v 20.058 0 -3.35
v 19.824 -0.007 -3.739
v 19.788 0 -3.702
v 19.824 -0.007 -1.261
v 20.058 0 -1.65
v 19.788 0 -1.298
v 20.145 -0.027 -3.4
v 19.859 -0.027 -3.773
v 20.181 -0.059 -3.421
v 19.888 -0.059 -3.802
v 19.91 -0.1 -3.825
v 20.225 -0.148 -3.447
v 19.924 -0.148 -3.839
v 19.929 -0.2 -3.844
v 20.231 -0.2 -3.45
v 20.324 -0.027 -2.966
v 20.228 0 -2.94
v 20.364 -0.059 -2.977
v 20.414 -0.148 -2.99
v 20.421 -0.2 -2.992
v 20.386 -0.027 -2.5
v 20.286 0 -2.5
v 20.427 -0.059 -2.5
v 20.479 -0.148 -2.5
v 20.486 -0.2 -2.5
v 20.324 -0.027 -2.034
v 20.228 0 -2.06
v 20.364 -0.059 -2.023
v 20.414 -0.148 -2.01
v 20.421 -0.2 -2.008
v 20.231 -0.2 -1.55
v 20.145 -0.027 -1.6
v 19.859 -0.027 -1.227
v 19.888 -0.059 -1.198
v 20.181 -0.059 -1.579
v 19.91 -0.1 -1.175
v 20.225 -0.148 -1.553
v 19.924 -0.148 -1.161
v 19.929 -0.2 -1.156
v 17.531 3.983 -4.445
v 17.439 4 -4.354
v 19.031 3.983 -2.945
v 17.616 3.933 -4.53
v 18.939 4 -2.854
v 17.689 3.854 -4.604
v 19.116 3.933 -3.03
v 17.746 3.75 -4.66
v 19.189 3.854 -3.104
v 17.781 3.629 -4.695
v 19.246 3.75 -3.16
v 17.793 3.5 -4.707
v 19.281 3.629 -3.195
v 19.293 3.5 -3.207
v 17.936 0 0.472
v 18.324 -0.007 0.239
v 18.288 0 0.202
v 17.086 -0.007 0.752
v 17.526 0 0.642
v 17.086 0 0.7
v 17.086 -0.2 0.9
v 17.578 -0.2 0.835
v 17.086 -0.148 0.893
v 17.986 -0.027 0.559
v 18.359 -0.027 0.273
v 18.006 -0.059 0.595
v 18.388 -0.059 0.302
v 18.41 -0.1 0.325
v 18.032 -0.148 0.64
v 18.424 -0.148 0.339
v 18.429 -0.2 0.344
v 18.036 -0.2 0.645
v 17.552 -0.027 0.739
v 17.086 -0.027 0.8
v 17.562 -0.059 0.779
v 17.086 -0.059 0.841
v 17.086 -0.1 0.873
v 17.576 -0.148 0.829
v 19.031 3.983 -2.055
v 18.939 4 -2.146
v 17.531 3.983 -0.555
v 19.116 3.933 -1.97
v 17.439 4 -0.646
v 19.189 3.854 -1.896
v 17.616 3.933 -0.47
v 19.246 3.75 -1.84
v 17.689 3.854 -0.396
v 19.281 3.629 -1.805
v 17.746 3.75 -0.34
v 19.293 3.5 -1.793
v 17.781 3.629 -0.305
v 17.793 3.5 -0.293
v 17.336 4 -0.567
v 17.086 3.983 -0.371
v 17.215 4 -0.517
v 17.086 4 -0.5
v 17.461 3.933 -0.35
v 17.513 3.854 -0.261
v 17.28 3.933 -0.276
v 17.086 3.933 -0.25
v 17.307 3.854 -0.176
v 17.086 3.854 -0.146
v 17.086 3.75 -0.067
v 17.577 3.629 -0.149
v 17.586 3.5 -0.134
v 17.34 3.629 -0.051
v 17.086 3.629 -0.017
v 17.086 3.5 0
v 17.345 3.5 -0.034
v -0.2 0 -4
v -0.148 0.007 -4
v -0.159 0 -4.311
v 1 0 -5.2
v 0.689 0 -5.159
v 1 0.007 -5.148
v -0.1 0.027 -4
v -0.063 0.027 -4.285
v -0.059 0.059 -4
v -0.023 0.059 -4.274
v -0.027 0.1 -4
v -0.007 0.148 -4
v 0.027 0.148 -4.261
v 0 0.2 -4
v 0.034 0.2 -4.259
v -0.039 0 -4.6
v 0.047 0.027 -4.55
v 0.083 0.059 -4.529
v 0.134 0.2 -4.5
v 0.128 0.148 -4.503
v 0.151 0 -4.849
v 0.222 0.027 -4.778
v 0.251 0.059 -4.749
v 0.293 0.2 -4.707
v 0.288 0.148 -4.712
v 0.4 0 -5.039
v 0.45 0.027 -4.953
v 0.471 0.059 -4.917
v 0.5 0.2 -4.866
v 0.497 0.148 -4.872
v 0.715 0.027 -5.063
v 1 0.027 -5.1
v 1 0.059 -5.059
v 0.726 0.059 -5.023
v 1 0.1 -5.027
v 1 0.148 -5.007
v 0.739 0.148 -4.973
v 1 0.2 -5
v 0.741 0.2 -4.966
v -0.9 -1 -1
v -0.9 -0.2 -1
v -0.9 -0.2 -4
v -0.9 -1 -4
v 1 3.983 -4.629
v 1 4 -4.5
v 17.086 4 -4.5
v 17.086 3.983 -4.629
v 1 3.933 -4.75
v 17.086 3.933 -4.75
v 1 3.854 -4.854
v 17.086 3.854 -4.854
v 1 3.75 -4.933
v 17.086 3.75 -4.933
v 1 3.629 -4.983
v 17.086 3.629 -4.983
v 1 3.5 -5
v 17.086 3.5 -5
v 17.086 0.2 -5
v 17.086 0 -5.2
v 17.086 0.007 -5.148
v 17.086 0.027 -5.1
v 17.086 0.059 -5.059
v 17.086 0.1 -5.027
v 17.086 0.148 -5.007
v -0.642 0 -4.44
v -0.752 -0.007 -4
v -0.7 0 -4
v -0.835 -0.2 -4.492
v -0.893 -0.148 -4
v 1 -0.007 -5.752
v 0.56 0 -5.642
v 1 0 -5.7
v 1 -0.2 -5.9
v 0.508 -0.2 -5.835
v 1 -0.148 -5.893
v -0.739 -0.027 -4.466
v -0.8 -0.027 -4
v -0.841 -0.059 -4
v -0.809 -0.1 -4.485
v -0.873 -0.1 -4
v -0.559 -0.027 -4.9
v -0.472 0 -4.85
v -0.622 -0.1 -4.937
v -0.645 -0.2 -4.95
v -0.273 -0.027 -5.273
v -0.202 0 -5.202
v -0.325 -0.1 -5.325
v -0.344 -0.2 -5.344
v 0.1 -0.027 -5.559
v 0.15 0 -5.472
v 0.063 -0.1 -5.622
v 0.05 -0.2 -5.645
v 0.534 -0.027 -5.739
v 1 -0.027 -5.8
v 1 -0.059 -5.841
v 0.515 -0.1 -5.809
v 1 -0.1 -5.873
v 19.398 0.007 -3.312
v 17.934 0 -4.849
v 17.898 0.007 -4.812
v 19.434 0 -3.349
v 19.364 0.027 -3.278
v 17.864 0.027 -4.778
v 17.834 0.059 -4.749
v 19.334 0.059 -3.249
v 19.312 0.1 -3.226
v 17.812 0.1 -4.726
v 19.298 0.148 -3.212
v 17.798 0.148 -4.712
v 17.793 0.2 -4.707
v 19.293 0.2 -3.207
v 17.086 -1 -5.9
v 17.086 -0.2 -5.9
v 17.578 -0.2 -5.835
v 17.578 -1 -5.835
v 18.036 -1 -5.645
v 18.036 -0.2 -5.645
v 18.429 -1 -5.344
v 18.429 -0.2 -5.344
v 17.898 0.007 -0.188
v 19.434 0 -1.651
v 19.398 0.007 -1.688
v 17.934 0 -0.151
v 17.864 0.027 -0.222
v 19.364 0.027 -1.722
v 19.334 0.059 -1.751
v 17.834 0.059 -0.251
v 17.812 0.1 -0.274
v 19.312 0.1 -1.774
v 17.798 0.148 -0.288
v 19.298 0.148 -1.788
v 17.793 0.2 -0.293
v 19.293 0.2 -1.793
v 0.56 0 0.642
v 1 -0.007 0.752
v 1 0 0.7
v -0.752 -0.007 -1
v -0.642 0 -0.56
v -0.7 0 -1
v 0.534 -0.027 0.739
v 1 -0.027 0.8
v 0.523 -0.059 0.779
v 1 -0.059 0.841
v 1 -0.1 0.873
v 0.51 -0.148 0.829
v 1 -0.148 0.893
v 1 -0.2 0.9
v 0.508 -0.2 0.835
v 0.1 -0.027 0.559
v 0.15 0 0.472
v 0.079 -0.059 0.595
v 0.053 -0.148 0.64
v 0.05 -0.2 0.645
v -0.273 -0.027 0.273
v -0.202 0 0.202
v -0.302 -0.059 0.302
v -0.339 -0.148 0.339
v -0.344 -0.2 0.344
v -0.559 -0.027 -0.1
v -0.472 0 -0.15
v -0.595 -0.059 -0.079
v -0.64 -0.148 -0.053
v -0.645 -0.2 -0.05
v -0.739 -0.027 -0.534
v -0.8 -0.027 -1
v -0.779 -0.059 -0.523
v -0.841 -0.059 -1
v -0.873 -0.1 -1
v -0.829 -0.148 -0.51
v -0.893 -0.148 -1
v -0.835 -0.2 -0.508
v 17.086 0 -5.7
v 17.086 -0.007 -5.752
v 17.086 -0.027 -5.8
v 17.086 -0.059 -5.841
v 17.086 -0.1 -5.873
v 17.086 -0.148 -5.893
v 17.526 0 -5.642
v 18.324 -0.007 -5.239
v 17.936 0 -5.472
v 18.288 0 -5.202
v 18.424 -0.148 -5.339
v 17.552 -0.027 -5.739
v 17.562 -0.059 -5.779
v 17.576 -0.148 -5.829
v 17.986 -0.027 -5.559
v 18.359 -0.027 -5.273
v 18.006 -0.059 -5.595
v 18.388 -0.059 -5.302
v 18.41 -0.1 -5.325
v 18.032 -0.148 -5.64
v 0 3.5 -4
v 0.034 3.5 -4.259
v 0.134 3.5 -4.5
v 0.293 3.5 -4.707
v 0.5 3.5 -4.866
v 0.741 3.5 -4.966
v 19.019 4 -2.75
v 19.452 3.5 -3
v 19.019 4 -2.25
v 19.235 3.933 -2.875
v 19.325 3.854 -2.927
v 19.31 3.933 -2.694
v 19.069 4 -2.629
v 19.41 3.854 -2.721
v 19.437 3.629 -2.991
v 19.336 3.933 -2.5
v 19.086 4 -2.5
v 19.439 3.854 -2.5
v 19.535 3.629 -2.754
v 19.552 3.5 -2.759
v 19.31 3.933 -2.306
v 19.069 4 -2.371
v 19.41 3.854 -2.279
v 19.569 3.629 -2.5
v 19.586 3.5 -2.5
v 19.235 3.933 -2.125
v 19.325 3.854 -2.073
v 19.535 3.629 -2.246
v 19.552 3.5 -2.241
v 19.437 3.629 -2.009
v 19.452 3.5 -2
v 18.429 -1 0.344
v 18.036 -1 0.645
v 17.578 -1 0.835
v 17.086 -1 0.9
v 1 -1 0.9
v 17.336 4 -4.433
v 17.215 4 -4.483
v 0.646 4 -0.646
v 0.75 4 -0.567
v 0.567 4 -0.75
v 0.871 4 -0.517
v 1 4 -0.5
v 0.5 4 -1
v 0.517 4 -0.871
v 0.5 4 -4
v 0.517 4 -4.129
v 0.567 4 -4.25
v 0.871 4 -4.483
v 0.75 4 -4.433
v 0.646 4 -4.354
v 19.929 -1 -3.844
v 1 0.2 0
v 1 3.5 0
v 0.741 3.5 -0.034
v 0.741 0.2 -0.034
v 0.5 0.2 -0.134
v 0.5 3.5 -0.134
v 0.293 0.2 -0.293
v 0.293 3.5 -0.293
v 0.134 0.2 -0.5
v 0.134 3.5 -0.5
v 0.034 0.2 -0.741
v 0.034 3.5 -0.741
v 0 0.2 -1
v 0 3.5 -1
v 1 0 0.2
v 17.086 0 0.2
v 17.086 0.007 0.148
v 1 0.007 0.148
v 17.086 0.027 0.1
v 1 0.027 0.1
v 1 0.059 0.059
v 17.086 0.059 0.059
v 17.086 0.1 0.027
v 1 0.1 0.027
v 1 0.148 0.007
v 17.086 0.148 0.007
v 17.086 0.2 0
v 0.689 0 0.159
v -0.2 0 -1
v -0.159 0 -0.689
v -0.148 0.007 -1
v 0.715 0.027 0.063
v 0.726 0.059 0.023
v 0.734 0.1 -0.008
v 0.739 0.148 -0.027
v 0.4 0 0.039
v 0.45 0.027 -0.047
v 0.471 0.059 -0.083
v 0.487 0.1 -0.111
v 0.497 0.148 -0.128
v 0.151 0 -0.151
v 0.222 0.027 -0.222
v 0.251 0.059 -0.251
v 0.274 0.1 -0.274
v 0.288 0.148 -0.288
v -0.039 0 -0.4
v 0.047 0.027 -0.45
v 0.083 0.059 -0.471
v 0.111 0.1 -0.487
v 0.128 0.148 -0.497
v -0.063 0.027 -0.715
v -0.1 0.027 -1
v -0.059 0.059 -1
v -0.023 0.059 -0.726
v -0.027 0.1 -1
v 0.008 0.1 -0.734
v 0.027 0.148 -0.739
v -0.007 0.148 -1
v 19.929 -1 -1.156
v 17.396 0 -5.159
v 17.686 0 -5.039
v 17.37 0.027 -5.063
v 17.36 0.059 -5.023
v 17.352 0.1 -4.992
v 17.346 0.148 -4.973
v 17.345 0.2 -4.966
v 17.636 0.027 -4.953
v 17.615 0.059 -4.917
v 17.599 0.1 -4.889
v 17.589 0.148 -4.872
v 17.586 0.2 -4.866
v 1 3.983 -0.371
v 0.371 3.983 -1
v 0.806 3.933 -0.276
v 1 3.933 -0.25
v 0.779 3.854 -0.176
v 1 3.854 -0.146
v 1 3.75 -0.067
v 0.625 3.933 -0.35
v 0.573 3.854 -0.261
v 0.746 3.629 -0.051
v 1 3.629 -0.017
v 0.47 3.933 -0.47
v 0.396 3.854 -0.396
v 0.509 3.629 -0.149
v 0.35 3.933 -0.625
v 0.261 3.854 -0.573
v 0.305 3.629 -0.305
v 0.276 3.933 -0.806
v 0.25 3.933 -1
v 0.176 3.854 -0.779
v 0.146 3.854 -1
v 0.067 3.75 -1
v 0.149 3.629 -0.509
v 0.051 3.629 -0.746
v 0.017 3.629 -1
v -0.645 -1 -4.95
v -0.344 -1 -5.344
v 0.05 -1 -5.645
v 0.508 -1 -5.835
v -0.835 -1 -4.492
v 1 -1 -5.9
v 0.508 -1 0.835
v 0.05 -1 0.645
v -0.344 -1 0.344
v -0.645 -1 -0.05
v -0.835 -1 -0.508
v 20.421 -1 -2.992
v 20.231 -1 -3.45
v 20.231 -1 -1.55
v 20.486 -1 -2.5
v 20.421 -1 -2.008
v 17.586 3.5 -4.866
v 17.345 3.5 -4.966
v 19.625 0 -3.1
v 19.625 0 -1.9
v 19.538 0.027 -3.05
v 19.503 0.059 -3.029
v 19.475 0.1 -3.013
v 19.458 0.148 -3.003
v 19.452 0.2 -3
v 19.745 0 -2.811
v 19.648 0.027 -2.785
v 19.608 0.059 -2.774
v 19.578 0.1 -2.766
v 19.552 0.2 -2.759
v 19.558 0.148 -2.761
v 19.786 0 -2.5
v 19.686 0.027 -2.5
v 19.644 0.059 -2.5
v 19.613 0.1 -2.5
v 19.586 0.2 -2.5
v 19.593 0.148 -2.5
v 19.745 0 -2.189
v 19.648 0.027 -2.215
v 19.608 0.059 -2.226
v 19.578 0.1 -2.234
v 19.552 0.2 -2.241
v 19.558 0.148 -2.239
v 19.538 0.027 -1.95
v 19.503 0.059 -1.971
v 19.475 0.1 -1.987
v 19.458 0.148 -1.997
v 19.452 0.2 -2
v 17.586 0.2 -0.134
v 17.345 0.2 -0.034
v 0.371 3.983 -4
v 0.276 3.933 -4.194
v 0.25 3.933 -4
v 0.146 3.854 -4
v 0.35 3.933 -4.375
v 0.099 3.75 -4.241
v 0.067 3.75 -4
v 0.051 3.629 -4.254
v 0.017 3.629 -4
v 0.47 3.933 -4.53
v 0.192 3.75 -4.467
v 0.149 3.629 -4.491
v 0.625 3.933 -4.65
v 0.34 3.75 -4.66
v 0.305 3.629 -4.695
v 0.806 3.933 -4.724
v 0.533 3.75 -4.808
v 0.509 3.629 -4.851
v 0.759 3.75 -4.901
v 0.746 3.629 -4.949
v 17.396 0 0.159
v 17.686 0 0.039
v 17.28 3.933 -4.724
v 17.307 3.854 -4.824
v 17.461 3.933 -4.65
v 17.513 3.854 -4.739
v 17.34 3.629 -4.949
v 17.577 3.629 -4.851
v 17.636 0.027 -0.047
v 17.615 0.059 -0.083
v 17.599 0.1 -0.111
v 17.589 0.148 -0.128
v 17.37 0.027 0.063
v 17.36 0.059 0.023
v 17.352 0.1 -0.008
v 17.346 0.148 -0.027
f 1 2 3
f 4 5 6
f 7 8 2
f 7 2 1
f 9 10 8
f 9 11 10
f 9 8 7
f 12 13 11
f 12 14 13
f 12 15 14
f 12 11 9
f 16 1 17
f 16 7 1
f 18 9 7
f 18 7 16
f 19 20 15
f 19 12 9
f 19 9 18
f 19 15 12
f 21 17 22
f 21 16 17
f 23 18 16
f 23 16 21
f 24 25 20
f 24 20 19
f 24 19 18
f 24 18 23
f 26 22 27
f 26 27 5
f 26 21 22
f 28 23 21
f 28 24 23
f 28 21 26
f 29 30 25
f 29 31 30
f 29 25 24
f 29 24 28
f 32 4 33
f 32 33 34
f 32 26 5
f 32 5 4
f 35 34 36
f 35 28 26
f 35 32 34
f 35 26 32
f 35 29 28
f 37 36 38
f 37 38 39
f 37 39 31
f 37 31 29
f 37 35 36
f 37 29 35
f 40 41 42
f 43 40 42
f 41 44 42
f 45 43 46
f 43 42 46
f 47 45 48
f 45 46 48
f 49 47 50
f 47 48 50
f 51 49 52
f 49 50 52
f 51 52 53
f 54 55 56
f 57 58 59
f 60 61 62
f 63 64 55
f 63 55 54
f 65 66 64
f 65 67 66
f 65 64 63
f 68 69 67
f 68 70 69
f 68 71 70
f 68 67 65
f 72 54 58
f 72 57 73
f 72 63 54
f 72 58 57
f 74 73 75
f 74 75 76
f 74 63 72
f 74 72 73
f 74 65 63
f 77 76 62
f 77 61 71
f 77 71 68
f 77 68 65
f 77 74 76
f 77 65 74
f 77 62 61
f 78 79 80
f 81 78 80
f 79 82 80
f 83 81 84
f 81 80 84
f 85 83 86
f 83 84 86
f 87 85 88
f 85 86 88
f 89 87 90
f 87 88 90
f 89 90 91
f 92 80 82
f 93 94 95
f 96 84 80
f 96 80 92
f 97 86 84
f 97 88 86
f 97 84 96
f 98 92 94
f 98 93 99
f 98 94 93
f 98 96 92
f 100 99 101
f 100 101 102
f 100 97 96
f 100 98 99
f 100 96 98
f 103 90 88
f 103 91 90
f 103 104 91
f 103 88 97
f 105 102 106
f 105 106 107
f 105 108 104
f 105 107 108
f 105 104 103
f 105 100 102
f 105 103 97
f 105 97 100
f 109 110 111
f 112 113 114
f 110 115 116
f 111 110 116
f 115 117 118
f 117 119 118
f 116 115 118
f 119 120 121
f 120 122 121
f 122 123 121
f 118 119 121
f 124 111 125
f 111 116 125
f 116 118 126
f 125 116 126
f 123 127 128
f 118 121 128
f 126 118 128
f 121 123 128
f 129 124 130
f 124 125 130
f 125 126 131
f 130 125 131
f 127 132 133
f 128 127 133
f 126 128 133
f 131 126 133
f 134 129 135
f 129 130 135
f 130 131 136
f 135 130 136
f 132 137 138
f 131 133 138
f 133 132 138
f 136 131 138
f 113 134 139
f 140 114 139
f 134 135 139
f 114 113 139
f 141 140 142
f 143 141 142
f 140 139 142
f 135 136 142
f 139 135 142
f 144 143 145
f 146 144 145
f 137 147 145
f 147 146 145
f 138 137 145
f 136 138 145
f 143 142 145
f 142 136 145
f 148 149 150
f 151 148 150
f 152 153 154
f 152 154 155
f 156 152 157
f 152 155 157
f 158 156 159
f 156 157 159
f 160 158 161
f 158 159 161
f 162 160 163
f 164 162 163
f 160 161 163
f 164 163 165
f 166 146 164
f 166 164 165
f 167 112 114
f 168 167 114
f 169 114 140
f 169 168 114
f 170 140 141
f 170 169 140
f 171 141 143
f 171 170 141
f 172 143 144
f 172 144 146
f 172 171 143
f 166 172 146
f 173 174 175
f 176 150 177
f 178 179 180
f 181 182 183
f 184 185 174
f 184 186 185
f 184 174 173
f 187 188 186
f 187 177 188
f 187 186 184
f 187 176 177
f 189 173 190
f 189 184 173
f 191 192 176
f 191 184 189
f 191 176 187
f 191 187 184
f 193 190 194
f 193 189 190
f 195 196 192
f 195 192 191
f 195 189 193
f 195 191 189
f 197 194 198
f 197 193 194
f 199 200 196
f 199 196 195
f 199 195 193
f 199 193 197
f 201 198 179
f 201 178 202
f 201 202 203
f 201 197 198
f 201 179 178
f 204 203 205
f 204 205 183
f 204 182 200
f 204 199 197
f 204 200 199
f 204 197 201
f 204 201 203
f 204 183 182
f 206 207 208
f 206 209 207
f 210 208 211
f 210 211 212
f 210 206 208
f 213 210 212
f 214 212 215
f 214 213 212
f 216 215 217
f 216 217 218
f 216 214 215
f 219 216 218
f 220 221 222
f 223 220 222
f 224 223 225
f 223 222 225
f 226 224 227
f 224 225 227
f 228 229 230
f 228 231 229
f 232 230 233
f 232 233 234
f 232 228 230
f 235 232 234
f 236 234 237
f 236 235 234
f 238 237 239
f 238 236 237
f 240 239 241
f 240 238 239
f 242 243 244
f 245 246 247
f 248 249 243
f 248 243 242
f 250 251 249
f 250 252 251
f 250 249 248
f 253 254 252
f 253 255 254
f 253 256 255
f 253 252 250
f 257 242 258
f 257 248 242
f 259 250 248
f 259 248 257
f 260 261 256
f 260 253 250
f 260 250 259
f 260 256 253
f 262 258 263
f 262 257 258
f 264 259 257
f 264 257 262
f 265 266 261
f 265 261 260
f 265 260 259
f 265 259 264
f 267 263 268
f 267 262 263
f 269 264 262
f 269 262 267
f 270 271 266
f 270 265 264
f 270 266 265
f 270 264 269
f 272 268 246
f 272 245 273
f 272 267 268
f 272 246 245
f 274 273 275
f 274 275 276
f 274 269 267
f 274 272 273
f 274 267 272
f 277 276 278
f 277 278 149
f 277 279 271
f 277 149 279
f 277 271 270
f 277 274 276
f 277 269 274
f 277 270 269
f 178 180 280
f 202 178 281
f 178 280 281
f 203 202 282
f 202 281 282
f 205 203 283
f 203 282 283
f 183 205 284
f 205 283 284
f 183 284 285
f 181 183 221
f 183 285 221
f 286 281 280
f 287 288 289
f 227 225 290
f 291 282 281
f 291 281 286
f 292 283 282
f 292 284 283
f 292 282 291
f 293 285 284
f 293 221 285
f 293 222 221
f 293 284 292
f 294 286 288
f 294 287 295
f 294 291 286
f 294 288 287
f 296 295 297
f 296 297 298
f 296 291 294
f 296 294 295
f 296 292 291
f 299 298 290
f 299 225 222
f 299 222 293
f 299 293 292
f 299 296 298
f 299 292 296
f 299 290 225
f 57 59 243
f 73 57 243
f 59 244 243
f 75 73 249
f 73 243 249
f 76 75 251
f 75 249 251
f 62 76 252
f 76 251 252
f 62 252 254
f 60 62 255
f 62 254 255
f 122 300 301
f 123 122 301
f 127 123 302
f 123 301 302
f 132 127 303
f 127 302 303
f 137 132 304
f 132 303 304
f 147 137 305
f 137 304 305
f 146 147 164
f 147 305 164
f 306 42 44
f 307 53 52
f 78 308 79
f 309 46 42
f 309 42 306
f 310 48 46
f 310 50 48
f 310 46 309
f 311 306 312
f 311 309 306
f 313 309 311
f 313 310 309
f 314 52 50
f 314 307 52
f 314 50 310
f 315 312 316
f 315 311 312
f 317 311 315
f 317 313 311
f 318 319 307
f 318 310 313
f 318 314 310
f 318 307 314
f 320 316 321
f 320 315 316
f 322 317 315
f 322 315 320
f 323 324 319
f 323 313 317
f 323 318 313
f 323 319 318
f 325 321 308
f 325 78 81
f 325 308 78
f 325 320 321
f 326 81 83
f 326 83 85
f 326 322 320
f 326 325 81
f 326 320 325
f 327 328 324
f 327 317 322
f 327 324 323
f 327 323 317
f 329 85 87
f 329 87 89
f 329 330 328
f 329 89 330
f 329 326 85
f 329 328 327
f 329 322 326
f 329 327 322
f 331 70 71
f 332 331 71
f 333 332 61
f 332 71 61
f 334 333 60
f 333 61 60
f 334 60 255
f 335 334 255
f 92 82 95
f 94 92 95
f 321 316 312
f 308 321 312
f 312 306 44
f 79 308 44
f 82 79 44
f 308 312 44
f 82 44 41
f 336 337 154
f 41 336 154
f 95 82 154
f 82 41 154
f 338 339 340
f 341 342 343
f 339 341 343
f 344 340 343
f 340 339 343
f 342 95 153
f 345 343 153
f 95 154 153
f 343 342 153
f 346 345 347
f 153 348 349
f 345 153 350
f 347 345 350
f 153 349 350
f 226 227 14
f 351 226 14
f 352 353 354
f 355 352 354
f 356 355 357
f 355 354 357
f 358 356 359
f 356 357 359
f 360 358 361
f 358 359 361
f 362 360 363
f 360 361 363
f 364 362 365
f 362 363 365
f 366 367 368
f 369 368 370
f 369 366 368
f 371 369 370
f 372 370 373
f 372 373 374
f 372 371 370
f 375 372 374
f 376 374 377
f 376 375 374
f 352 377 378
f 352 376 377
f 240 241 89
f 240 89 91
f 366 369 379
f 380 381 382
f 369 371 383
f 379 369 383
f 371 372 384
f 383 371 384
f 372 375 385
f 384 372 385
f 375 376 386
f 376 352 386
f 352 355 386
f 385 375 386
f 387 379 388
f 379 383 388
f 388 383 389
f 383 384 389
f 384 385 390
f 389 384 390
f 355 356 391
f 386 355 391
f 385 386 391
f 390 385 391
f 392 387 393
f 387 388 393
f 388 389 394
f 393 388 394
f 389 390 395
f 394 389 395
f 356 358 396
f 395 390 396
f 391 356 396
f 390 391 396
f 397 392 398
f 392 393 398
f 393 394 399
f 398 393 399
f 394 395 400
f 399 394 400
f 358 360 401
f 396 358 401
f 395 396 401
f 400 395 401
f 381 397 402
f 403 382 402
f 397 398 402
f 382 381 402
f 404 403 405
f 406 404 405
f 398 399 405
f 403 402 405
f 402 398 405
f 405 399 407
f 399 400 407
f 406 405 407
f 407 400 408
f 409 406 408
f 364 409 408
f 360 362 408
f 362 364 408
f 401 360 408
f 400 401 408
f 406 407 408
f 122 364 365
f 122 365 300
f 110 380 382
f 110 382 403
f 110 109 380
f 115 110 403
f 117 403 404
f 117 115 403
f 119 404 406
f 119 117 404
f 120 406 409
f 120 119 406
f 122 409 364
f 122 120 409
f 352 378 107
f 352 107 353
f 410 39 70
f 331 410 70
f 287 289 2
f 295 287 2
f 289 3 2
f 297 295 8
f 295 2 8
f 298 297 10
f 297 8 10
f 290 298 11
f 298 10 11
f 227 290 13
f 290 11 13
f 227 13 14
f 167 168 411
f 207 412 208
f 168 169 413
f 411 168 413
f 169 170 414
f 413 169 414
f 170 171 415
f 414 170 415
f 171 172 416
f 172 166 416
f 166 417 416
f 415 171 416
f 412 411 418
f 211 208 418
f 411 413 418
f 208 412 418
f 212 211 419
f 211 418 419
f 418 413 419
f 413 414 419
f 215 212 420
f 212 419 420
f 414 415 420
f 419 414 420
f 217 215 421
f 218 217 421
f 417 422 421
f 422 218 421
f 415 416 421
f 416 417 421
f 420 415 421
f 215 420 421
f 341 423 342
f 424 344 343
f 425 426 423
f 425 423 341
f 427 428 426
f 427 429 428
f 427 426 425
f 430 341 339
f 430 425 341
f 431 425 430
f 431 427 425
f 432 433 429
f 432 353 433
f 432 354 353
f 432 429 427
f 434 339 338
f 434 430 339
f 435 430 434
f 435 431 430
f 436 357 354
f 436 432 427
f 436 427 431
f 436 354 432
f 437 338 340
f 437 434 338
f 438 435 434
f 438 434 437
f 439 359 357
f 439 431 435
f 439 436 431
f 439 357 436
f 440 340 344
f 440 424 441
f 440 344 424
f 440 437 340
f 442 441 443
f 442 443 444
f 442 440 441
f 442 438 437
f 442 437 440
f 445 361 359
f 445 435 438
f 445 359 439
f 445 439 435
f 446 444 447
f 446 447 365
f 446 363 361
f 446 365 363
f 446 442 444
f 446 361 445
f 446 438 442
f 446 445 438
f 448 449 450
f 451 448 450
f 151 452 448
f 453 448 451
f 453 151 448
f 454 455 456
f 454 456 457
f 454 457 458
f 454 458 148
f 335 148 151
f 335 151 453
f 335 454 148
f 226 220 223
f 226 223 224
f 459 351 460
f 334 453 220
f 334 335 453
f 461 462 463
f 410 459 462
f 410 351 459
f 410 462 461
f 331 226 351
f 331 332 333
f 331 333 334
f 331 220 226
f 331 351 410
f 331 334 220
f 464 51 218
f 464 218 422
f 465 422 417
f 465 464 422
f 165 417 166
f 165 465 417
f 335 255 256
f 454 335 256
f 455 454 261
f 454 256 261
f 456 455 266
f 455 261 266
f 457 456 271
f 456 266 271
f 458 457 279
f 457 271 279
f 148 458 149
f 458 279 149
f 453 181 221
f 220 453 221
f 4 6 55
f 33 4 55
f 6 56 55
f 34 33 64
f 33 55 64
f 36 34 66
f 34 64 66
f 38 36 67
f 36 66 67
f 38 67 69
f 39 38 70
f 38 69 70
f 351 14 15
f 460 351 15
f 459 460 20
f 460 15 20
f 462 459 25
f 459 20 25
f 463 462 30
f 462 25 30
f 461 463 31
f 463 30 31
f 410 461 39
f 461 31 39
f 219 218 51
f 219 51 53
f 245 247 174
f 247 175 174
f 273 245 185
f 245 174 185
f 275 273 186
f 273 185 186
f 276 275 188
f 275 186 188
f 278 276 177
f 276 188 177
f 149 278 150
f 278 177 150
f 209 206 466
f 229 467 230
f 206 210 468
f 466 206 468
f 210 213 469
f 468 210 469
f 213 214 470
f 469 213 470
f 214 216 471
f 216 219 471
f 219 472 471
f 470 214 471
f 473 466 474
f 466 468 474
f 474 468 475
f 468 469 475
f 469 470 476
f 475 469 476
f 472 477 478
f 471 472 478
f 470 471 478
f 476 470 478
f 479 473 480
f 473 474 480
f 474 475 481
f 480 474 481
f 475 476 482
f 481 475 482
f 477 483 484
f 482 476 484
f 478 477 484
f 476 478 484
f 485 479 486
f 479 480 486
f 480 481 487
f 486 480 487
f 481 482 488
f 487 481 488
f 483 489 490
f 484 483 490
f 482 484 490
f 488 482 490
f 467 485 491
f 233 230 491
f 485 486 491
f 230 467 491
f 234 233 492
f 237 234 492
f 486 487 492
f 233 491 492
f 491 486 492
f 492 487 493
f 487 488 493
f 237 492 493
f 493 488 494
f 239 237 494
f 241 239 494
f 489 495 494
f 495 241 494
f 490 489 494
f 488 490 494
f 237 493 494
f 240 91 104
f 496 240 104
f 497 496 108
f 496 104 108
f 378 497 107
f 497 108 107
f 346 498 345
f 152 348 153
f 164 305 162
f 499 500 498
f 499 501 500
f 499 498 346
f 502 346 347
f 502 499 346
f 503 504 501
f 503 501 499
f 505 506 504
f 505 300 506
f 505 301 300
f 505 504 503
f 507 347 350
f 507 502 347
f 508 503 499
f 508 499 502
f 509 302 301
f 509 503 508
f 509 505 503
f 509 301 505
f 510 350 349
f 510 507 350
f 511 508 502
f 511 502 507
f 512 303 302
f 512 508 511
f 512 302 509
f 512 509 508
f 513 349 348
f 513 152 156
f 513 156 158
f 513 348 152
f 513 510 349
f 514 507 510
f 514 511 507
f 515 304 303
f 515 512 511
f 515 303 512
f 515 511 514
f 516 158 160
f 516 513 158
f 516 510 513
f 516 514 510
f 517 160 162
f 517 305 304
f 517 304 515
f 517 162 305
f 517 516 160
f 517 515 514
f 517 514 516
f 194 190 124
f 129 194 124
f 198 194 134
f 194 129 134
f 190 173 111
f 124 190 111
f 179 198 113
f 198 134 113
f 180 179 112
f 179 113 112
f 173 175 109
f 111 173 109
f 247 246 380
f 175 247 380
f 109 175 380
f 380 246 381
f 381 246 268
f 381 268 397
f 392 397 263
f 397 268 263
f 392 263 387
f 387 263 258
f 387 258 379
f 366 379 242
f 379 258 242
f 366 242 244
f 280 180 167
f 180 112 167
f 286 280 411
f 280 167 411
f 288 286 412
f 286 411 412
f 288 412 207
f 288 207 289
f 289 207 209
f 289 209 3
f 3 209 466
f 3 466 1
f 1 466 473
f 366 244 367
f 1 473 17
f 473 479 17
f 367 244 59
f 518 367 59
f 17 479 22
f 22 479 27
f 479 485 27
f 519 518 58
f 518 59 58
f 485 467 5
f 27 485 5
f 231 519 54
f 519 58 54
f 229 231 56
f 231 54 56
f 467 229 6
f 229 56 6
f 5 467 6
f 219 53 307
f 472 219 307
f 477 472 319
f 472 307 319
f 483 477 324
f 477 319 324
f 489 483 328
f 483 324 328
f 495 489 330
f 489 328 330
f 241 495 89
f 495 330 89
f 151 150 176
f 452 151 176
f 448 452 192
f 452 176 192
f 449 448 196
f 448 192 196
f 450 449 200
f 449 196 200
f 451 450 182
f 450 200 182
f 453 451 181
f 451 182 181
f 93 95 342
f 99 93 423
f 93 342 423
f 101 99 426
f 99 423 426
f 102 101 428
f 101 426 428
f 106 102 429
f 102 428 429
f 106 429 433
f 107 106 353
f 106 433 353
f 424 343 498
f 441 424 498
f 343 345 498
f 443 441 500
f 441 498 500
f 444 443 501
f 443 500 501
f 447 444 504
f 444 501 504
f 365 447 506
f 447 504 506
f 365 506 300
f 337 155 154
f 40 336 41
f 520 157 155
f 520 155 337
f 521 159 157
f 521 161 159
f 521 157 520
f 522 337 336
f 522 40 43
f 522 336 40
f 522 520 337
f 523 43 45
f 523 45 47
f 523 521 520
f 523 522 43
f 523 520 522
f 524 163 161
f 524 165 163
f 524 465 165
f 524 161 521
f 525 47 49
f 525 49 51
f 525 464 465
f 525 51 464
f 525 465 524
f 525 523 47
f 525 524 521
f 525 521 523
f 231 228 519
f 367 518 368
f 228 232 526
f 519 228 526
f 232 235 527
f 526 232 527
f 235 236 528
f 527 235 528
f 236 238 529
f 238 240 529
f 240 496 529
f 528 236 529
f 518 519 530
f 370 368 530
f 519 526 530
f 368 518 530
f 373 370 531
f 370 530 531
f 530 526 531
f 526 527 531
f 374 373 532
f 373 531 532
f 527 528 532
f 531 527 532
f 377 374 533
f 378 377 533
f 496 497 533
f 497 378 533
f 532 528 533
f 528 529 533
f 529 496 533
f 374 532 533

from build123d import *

# Parameters (mm, degrees)
BOSS_EXTRUDE1_DEPTH = 4
FILLET1_R           = 1
FILLET2_R           = 0.5
BOSS_EXTRUDE2_DEPTH = 1
FILLET3_R           = 0.2
FILLET4_R           = 0.2


with BuildPart() as part:
    # Sketch1 → Boss-Extrude1 (new body)
    with BuildSketch(Plane(origin=(0, 0, 0), x_dir=(1, 0, 0), z_dir=(0, 1, 0))):
        Polygon((17.5, 5), (20, 2.5), (17.5, 0), (0, 0), (0, 5), align=None)
    extrude(amount=BOSS_EXTRUDE1_DEPTH)

    # Fillet1
    fillet1_edges = [part.edges().sort_by_distance(p)[0] for p in [
        (0, 2, -5),
        (17.5, 2, -5),
        (20, 2, -2.5),
        (17.5, 2, 0),
        (0, 2, 0),
    ]]
    fillet(fillet1_edges, radius=FILLET1_R)

    # Fillet2
    fillet2_edges = [part.edges().sort_by_distance(p)[0] for p in [
        (9.042893219, 4, -5),
        (18.542893219, 4, -3.957106781),
        (0, 4, -2.5),
        (9.042893219, 4, 0),
        (18.542893219, 4, -1.042893219),
        (19.585786438, 4, -2.5),
        (17.46846987, 4, -0.076120467),
        (0.292893219, 4, -0.292893219),
        (0.292893219, 4, -4.707106781),
        (17.46846987, 4, -4.923879533),
    ]]
    fillet(fillet2_edges, radius=FILLET2_R)

    # Sketch2 → Boss-Extrude2 (add)
    with BuildSketch(Plane.XZ):
        with BuildLine():
            Line((1, -5.9), (17.085786438, -5.9))
            ThreePointArc((17.085786438, -5.9), (17.812884959, -5.755371112), (18.429289322, -5.343502884))
            Line((18.429289322, -5.343502884), (19.929289322, -3.843502884))
            ThreePointArc((19.929289322, -3.843502884), (20.485786438, -2.5), (19.929289322, -1.156497116))
            Line((19.929289322, -1.156497116), (18.429289322, 0.343502884))
            ThreePointArc((18.429289322, 0.343502884), (17.812884959, 0.755371112), (17.085786438, 0.9))
            Line((17.085786438, 0.9), (1, 0.9))
            ThreePointArc((1, 0.9), (-0.343502884, 0.343502884), (-0.9, -1))
            Line((-0.9, -1), (-0.9, -4))
            ThreePointArc((-0.9, -4), (-0.343502884, -5.343502884), (1, -5.9))
        make_face()
    extrude(amount=BOSS_EXTRUDE2_DEPTH)

    # Fillet3
    fillet3_edges = [part.edges().sort_by_distance(p)[0] for p in [
        (9.042893219, 0, -5),
        (0, 0, -2.5),
        (18.542893219, 0, -3.957106781),
        (18.542893219, 0, -1.042893219),
        (9.042893219, 0, 0),
        (19.585786438, 0, -2.5),
        (17.46846987, 0, -0.076120467),
        (0.292893219, 0, -0.292893219),
        (0.292893219, 0, -4.707106781),
        (17.46846987, 0, -4.923879533),
    ]]
    fillet(fillet3_edges, radius=FILLET3_R)

    # Fillet4
    fillet4_edges = [part.edges().sort_by_distance(p)[0] for p in [
        (-0.343502884, 0, -5.343502884),
        (9.042893219, 0, -5.9),
        (17.812884959, 0, -5.755371112),
        (19.179289322, 0, -4.593502884),
        (20.485786438, 0, -2.5),
        (19.179289322, 0, -0.406497116),
        (17.812884959, 0, 0.755371112),
        (9.042893219, 0, 0.9),
        (-0.343502884, 0, 0.343502884),
        (-0.9, 0, -2.5),
    ]]
    fillet(fillet4_edges, radius=FILLET4_R)


solid = part.part
